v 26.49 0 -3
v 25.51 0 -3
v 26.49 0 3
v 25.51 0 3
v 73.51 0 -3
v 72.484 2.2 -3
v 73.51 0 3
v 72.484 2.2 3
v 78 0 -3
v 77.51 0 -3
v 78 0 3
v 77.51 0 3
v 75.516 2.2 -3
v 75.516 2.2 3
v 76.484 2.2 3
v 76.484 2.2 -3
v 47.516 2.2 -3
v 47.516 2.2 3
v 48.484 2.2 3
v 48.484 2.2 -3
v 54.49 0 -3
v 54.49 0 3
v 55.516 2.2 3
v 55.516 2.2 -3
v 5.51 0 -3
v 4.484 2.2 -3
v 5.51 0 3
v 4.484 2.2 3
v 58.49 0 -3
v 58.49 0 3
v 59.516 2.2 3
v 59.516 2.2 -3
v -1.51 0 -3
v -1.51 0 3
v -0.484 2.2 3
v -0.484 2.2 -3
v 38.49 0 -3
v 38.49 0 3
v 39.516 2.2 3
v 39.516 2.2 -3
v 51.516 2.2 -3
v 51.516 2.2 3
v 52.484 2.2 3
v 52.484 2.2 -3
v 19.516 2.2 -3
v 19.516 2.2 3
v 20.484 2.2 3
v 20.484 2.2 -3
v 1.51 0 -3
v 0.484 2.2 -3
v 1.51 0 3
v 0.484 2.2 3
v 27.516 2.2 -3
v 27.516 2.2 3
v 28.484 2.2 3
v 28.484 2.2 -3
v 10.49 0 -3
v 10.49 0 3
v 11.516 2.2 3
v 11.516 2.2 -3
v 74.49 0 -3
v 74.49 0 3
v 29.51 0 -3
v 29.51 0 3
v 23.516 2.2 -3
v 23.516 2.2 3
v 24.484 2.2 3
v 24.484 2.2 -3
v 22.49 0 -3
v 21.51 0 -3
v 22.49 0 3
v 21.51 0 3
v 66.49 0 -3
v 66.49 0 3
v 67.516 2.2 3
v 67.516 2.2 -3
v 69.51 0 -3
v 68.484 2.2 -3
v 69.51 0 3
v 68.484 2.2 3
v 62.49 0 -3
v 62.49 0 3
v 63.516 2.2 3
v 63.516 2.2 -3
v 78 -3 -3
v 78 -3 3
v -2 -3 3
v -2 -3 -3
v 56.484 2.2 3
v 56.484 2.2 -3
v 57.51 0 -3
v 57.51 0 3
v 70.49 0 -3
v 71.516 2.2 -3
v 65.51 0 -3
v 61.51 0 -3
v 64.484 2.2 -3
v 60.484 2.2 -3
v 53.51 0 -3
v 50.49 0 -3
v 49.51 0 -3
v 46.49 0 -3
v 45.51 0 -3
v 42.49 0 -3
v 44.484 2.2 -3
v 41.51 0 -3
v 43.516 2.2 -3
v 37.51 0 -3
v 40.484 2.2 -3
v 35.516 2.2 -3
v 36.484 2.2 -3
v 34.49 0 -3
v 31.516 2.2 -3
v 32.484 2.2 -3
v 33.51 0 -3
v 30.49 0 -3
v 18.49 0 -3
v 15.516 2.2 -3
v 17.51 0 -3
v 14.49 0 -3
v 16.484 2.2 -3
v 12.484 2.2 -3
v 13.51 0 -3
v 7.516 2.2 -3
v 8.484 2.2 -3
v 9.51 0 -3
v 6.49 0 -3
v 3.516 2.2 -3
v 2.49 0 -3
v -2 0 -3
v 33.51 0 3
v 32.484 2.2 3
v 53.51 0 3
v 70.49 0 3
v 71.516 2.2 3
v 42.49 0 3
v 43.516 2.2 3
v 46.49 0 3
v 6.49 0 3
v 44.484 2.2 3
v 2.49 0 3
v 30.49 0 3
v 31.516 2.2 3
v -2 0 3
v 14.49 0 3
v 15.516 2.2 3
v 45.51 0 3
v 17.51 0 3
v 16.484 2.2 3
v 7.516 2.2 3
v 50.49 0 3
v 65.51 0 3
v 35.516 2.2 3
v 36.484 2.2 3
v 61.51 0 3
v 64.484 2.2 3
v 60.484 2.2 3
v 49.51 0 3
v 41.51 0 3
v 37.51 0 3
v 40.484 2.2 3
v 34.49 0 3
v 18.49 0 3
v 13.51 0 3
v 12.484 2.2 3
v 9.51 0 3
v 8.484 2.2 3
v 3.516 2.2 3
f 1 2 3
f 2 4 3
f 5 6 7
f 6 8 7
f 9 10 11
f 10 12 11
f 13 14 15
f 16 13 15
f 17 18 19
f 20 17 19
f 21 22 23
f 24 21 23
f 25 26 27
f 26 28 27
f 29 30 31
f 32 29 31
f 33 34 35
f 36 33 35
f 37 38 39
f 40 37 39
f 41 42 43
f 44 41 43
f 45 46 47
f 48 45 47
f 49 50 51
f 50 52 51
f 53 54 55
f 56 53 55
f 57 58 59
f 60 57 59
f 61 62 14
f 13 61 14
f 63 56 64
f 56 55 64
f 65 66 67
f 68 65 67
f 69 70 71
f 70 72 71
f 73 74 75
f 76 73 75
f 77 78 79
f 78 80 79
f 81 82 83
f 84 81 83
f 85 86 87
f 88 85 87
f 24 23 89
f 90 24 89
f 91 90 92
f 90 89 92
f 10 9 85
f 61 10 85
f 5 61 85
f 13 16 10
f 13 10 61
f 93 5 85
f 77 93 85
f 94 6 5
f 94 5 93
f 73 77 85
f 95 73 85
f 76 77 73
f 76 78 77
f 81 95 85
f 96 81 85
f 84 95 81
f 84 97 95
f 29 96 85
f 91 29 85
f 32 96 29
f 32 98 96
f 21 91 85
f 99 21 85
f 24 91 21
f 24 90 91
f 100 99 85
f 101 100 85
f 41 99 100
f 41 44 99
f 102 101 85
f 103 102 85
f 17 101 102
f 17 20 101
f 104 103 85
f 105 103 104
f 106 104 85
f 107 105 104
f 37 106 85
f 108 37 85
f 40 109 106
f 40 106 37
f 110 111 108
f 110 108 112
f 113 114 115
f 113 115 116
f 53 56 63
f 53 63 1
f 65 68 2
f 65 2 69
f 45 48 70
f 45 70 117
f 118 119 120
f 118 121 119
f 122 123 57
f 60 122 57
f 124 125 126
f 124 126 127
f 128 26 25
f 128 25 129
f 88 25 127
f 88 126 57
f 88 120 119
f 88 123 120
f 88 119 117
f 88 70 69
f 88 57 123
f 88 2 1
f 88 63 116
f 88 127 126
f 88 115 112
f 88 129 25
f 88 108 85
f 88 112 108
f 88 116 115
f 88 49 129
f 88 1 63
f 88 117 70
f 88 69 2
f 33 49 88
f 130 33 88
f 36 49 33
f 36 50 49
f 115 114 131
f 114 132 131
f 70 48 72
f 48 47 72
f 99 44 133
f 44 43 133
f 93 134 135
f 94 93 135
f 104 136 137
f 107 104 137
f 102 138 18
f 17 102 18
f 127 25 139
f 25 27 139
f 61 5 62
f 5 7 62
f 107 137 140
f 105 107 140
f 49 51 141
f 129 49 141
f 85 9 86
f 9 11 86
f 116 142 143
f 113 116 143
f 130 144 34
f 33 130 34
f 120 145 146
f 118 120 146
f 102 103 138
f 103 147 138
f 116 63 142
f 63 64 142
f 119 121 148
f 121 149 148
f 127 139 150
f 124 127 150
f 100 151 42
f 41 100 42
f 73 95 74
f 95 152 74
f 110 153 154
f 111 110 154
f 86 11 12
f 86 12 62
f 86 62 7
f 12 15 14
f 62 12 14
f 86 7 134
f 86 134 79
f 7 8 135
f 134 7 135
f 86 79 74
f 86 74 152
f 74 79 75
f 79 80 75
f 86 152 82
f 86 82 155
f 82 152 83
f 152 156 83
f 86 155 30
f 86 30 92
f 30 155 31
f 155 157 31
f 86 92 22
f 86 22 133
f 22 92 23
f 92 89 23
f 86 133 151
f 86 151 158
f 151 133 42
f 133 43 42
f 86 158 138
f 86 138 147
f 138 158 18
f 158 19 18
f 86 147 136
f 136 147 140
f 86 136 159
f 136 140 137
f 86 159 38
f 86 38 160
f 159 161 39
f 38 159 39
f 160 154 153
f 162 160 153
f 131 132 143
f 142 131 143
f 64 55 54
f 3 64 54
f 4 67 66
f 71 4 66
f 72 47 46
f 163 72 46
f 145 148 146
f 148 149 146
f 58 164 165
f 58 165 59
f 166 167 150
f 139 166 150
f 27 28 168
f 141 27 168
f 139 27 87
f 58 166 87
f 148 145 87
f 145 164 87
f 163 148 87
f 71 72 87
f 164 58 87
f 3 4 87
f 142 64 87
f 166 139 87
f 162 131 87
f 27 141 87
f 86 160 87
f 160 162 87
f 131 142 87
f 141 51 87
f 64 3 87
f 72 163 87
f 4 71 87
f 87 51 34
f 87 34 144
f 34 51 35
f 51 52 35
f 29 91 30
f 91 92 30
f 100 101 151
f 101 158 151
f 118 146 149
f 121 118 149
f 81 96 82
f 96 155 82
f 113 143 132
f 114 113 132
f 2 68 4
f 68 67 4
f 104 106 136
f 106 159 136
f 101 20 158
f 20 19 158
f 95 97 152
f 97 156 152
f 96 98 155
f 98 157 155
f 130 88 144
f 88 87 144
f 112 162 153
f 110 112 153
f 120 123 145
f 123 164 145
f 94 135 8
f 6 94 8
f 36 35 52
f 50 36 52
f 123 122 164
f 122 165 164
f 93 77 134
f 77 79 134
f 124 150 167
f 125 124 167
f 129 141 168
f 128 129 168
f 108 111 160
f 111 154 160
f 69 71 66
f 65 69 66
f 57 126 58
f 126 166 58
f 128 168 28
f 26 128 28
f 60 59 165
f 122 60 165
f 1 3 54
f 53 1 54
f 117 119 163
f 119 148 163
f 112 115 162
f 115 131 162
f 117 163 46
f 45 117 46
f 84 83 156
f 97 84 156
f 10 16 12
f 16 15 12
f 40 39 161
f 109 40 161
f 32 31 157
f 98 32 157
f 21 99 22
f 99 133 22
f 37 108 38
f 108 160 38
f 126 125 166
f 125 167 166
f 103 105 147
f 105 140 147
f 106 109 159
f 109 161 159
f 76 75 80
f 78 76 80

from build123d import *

# Parameters (mm, degrees)
EXTRUDE_TOOTH_DEPTH = 3
PATTERN_TEETH_COUNT = 20
PATTERN_TEETH_PITCH = 4


with BuildPart() as part:
    # Sketch1 → Extrude Tooth (new, symmetric)
    with BuildSketch(Plane.XY):
        Polygon((-0.483692342, 2.2), (0.483692342, 2.2), (1.50956919, 0), (2, 0), (2, -3), (-2, -3), (-2, 0), (-1.50956919, 0), align=None)
    extrude_tooth = extrude(amount=EXTRUDE_TOOTH_DEPTH, both=True)

    # Pattern Teeth: Extrude Tooth ×20
    with Locations(*[(i * PATTERN_TEETH_PITCH, 0, 0) for i in range(1, PATTERN_TEETH_COUNT)]):
        add(extrude_tooth)


solid = part.part
